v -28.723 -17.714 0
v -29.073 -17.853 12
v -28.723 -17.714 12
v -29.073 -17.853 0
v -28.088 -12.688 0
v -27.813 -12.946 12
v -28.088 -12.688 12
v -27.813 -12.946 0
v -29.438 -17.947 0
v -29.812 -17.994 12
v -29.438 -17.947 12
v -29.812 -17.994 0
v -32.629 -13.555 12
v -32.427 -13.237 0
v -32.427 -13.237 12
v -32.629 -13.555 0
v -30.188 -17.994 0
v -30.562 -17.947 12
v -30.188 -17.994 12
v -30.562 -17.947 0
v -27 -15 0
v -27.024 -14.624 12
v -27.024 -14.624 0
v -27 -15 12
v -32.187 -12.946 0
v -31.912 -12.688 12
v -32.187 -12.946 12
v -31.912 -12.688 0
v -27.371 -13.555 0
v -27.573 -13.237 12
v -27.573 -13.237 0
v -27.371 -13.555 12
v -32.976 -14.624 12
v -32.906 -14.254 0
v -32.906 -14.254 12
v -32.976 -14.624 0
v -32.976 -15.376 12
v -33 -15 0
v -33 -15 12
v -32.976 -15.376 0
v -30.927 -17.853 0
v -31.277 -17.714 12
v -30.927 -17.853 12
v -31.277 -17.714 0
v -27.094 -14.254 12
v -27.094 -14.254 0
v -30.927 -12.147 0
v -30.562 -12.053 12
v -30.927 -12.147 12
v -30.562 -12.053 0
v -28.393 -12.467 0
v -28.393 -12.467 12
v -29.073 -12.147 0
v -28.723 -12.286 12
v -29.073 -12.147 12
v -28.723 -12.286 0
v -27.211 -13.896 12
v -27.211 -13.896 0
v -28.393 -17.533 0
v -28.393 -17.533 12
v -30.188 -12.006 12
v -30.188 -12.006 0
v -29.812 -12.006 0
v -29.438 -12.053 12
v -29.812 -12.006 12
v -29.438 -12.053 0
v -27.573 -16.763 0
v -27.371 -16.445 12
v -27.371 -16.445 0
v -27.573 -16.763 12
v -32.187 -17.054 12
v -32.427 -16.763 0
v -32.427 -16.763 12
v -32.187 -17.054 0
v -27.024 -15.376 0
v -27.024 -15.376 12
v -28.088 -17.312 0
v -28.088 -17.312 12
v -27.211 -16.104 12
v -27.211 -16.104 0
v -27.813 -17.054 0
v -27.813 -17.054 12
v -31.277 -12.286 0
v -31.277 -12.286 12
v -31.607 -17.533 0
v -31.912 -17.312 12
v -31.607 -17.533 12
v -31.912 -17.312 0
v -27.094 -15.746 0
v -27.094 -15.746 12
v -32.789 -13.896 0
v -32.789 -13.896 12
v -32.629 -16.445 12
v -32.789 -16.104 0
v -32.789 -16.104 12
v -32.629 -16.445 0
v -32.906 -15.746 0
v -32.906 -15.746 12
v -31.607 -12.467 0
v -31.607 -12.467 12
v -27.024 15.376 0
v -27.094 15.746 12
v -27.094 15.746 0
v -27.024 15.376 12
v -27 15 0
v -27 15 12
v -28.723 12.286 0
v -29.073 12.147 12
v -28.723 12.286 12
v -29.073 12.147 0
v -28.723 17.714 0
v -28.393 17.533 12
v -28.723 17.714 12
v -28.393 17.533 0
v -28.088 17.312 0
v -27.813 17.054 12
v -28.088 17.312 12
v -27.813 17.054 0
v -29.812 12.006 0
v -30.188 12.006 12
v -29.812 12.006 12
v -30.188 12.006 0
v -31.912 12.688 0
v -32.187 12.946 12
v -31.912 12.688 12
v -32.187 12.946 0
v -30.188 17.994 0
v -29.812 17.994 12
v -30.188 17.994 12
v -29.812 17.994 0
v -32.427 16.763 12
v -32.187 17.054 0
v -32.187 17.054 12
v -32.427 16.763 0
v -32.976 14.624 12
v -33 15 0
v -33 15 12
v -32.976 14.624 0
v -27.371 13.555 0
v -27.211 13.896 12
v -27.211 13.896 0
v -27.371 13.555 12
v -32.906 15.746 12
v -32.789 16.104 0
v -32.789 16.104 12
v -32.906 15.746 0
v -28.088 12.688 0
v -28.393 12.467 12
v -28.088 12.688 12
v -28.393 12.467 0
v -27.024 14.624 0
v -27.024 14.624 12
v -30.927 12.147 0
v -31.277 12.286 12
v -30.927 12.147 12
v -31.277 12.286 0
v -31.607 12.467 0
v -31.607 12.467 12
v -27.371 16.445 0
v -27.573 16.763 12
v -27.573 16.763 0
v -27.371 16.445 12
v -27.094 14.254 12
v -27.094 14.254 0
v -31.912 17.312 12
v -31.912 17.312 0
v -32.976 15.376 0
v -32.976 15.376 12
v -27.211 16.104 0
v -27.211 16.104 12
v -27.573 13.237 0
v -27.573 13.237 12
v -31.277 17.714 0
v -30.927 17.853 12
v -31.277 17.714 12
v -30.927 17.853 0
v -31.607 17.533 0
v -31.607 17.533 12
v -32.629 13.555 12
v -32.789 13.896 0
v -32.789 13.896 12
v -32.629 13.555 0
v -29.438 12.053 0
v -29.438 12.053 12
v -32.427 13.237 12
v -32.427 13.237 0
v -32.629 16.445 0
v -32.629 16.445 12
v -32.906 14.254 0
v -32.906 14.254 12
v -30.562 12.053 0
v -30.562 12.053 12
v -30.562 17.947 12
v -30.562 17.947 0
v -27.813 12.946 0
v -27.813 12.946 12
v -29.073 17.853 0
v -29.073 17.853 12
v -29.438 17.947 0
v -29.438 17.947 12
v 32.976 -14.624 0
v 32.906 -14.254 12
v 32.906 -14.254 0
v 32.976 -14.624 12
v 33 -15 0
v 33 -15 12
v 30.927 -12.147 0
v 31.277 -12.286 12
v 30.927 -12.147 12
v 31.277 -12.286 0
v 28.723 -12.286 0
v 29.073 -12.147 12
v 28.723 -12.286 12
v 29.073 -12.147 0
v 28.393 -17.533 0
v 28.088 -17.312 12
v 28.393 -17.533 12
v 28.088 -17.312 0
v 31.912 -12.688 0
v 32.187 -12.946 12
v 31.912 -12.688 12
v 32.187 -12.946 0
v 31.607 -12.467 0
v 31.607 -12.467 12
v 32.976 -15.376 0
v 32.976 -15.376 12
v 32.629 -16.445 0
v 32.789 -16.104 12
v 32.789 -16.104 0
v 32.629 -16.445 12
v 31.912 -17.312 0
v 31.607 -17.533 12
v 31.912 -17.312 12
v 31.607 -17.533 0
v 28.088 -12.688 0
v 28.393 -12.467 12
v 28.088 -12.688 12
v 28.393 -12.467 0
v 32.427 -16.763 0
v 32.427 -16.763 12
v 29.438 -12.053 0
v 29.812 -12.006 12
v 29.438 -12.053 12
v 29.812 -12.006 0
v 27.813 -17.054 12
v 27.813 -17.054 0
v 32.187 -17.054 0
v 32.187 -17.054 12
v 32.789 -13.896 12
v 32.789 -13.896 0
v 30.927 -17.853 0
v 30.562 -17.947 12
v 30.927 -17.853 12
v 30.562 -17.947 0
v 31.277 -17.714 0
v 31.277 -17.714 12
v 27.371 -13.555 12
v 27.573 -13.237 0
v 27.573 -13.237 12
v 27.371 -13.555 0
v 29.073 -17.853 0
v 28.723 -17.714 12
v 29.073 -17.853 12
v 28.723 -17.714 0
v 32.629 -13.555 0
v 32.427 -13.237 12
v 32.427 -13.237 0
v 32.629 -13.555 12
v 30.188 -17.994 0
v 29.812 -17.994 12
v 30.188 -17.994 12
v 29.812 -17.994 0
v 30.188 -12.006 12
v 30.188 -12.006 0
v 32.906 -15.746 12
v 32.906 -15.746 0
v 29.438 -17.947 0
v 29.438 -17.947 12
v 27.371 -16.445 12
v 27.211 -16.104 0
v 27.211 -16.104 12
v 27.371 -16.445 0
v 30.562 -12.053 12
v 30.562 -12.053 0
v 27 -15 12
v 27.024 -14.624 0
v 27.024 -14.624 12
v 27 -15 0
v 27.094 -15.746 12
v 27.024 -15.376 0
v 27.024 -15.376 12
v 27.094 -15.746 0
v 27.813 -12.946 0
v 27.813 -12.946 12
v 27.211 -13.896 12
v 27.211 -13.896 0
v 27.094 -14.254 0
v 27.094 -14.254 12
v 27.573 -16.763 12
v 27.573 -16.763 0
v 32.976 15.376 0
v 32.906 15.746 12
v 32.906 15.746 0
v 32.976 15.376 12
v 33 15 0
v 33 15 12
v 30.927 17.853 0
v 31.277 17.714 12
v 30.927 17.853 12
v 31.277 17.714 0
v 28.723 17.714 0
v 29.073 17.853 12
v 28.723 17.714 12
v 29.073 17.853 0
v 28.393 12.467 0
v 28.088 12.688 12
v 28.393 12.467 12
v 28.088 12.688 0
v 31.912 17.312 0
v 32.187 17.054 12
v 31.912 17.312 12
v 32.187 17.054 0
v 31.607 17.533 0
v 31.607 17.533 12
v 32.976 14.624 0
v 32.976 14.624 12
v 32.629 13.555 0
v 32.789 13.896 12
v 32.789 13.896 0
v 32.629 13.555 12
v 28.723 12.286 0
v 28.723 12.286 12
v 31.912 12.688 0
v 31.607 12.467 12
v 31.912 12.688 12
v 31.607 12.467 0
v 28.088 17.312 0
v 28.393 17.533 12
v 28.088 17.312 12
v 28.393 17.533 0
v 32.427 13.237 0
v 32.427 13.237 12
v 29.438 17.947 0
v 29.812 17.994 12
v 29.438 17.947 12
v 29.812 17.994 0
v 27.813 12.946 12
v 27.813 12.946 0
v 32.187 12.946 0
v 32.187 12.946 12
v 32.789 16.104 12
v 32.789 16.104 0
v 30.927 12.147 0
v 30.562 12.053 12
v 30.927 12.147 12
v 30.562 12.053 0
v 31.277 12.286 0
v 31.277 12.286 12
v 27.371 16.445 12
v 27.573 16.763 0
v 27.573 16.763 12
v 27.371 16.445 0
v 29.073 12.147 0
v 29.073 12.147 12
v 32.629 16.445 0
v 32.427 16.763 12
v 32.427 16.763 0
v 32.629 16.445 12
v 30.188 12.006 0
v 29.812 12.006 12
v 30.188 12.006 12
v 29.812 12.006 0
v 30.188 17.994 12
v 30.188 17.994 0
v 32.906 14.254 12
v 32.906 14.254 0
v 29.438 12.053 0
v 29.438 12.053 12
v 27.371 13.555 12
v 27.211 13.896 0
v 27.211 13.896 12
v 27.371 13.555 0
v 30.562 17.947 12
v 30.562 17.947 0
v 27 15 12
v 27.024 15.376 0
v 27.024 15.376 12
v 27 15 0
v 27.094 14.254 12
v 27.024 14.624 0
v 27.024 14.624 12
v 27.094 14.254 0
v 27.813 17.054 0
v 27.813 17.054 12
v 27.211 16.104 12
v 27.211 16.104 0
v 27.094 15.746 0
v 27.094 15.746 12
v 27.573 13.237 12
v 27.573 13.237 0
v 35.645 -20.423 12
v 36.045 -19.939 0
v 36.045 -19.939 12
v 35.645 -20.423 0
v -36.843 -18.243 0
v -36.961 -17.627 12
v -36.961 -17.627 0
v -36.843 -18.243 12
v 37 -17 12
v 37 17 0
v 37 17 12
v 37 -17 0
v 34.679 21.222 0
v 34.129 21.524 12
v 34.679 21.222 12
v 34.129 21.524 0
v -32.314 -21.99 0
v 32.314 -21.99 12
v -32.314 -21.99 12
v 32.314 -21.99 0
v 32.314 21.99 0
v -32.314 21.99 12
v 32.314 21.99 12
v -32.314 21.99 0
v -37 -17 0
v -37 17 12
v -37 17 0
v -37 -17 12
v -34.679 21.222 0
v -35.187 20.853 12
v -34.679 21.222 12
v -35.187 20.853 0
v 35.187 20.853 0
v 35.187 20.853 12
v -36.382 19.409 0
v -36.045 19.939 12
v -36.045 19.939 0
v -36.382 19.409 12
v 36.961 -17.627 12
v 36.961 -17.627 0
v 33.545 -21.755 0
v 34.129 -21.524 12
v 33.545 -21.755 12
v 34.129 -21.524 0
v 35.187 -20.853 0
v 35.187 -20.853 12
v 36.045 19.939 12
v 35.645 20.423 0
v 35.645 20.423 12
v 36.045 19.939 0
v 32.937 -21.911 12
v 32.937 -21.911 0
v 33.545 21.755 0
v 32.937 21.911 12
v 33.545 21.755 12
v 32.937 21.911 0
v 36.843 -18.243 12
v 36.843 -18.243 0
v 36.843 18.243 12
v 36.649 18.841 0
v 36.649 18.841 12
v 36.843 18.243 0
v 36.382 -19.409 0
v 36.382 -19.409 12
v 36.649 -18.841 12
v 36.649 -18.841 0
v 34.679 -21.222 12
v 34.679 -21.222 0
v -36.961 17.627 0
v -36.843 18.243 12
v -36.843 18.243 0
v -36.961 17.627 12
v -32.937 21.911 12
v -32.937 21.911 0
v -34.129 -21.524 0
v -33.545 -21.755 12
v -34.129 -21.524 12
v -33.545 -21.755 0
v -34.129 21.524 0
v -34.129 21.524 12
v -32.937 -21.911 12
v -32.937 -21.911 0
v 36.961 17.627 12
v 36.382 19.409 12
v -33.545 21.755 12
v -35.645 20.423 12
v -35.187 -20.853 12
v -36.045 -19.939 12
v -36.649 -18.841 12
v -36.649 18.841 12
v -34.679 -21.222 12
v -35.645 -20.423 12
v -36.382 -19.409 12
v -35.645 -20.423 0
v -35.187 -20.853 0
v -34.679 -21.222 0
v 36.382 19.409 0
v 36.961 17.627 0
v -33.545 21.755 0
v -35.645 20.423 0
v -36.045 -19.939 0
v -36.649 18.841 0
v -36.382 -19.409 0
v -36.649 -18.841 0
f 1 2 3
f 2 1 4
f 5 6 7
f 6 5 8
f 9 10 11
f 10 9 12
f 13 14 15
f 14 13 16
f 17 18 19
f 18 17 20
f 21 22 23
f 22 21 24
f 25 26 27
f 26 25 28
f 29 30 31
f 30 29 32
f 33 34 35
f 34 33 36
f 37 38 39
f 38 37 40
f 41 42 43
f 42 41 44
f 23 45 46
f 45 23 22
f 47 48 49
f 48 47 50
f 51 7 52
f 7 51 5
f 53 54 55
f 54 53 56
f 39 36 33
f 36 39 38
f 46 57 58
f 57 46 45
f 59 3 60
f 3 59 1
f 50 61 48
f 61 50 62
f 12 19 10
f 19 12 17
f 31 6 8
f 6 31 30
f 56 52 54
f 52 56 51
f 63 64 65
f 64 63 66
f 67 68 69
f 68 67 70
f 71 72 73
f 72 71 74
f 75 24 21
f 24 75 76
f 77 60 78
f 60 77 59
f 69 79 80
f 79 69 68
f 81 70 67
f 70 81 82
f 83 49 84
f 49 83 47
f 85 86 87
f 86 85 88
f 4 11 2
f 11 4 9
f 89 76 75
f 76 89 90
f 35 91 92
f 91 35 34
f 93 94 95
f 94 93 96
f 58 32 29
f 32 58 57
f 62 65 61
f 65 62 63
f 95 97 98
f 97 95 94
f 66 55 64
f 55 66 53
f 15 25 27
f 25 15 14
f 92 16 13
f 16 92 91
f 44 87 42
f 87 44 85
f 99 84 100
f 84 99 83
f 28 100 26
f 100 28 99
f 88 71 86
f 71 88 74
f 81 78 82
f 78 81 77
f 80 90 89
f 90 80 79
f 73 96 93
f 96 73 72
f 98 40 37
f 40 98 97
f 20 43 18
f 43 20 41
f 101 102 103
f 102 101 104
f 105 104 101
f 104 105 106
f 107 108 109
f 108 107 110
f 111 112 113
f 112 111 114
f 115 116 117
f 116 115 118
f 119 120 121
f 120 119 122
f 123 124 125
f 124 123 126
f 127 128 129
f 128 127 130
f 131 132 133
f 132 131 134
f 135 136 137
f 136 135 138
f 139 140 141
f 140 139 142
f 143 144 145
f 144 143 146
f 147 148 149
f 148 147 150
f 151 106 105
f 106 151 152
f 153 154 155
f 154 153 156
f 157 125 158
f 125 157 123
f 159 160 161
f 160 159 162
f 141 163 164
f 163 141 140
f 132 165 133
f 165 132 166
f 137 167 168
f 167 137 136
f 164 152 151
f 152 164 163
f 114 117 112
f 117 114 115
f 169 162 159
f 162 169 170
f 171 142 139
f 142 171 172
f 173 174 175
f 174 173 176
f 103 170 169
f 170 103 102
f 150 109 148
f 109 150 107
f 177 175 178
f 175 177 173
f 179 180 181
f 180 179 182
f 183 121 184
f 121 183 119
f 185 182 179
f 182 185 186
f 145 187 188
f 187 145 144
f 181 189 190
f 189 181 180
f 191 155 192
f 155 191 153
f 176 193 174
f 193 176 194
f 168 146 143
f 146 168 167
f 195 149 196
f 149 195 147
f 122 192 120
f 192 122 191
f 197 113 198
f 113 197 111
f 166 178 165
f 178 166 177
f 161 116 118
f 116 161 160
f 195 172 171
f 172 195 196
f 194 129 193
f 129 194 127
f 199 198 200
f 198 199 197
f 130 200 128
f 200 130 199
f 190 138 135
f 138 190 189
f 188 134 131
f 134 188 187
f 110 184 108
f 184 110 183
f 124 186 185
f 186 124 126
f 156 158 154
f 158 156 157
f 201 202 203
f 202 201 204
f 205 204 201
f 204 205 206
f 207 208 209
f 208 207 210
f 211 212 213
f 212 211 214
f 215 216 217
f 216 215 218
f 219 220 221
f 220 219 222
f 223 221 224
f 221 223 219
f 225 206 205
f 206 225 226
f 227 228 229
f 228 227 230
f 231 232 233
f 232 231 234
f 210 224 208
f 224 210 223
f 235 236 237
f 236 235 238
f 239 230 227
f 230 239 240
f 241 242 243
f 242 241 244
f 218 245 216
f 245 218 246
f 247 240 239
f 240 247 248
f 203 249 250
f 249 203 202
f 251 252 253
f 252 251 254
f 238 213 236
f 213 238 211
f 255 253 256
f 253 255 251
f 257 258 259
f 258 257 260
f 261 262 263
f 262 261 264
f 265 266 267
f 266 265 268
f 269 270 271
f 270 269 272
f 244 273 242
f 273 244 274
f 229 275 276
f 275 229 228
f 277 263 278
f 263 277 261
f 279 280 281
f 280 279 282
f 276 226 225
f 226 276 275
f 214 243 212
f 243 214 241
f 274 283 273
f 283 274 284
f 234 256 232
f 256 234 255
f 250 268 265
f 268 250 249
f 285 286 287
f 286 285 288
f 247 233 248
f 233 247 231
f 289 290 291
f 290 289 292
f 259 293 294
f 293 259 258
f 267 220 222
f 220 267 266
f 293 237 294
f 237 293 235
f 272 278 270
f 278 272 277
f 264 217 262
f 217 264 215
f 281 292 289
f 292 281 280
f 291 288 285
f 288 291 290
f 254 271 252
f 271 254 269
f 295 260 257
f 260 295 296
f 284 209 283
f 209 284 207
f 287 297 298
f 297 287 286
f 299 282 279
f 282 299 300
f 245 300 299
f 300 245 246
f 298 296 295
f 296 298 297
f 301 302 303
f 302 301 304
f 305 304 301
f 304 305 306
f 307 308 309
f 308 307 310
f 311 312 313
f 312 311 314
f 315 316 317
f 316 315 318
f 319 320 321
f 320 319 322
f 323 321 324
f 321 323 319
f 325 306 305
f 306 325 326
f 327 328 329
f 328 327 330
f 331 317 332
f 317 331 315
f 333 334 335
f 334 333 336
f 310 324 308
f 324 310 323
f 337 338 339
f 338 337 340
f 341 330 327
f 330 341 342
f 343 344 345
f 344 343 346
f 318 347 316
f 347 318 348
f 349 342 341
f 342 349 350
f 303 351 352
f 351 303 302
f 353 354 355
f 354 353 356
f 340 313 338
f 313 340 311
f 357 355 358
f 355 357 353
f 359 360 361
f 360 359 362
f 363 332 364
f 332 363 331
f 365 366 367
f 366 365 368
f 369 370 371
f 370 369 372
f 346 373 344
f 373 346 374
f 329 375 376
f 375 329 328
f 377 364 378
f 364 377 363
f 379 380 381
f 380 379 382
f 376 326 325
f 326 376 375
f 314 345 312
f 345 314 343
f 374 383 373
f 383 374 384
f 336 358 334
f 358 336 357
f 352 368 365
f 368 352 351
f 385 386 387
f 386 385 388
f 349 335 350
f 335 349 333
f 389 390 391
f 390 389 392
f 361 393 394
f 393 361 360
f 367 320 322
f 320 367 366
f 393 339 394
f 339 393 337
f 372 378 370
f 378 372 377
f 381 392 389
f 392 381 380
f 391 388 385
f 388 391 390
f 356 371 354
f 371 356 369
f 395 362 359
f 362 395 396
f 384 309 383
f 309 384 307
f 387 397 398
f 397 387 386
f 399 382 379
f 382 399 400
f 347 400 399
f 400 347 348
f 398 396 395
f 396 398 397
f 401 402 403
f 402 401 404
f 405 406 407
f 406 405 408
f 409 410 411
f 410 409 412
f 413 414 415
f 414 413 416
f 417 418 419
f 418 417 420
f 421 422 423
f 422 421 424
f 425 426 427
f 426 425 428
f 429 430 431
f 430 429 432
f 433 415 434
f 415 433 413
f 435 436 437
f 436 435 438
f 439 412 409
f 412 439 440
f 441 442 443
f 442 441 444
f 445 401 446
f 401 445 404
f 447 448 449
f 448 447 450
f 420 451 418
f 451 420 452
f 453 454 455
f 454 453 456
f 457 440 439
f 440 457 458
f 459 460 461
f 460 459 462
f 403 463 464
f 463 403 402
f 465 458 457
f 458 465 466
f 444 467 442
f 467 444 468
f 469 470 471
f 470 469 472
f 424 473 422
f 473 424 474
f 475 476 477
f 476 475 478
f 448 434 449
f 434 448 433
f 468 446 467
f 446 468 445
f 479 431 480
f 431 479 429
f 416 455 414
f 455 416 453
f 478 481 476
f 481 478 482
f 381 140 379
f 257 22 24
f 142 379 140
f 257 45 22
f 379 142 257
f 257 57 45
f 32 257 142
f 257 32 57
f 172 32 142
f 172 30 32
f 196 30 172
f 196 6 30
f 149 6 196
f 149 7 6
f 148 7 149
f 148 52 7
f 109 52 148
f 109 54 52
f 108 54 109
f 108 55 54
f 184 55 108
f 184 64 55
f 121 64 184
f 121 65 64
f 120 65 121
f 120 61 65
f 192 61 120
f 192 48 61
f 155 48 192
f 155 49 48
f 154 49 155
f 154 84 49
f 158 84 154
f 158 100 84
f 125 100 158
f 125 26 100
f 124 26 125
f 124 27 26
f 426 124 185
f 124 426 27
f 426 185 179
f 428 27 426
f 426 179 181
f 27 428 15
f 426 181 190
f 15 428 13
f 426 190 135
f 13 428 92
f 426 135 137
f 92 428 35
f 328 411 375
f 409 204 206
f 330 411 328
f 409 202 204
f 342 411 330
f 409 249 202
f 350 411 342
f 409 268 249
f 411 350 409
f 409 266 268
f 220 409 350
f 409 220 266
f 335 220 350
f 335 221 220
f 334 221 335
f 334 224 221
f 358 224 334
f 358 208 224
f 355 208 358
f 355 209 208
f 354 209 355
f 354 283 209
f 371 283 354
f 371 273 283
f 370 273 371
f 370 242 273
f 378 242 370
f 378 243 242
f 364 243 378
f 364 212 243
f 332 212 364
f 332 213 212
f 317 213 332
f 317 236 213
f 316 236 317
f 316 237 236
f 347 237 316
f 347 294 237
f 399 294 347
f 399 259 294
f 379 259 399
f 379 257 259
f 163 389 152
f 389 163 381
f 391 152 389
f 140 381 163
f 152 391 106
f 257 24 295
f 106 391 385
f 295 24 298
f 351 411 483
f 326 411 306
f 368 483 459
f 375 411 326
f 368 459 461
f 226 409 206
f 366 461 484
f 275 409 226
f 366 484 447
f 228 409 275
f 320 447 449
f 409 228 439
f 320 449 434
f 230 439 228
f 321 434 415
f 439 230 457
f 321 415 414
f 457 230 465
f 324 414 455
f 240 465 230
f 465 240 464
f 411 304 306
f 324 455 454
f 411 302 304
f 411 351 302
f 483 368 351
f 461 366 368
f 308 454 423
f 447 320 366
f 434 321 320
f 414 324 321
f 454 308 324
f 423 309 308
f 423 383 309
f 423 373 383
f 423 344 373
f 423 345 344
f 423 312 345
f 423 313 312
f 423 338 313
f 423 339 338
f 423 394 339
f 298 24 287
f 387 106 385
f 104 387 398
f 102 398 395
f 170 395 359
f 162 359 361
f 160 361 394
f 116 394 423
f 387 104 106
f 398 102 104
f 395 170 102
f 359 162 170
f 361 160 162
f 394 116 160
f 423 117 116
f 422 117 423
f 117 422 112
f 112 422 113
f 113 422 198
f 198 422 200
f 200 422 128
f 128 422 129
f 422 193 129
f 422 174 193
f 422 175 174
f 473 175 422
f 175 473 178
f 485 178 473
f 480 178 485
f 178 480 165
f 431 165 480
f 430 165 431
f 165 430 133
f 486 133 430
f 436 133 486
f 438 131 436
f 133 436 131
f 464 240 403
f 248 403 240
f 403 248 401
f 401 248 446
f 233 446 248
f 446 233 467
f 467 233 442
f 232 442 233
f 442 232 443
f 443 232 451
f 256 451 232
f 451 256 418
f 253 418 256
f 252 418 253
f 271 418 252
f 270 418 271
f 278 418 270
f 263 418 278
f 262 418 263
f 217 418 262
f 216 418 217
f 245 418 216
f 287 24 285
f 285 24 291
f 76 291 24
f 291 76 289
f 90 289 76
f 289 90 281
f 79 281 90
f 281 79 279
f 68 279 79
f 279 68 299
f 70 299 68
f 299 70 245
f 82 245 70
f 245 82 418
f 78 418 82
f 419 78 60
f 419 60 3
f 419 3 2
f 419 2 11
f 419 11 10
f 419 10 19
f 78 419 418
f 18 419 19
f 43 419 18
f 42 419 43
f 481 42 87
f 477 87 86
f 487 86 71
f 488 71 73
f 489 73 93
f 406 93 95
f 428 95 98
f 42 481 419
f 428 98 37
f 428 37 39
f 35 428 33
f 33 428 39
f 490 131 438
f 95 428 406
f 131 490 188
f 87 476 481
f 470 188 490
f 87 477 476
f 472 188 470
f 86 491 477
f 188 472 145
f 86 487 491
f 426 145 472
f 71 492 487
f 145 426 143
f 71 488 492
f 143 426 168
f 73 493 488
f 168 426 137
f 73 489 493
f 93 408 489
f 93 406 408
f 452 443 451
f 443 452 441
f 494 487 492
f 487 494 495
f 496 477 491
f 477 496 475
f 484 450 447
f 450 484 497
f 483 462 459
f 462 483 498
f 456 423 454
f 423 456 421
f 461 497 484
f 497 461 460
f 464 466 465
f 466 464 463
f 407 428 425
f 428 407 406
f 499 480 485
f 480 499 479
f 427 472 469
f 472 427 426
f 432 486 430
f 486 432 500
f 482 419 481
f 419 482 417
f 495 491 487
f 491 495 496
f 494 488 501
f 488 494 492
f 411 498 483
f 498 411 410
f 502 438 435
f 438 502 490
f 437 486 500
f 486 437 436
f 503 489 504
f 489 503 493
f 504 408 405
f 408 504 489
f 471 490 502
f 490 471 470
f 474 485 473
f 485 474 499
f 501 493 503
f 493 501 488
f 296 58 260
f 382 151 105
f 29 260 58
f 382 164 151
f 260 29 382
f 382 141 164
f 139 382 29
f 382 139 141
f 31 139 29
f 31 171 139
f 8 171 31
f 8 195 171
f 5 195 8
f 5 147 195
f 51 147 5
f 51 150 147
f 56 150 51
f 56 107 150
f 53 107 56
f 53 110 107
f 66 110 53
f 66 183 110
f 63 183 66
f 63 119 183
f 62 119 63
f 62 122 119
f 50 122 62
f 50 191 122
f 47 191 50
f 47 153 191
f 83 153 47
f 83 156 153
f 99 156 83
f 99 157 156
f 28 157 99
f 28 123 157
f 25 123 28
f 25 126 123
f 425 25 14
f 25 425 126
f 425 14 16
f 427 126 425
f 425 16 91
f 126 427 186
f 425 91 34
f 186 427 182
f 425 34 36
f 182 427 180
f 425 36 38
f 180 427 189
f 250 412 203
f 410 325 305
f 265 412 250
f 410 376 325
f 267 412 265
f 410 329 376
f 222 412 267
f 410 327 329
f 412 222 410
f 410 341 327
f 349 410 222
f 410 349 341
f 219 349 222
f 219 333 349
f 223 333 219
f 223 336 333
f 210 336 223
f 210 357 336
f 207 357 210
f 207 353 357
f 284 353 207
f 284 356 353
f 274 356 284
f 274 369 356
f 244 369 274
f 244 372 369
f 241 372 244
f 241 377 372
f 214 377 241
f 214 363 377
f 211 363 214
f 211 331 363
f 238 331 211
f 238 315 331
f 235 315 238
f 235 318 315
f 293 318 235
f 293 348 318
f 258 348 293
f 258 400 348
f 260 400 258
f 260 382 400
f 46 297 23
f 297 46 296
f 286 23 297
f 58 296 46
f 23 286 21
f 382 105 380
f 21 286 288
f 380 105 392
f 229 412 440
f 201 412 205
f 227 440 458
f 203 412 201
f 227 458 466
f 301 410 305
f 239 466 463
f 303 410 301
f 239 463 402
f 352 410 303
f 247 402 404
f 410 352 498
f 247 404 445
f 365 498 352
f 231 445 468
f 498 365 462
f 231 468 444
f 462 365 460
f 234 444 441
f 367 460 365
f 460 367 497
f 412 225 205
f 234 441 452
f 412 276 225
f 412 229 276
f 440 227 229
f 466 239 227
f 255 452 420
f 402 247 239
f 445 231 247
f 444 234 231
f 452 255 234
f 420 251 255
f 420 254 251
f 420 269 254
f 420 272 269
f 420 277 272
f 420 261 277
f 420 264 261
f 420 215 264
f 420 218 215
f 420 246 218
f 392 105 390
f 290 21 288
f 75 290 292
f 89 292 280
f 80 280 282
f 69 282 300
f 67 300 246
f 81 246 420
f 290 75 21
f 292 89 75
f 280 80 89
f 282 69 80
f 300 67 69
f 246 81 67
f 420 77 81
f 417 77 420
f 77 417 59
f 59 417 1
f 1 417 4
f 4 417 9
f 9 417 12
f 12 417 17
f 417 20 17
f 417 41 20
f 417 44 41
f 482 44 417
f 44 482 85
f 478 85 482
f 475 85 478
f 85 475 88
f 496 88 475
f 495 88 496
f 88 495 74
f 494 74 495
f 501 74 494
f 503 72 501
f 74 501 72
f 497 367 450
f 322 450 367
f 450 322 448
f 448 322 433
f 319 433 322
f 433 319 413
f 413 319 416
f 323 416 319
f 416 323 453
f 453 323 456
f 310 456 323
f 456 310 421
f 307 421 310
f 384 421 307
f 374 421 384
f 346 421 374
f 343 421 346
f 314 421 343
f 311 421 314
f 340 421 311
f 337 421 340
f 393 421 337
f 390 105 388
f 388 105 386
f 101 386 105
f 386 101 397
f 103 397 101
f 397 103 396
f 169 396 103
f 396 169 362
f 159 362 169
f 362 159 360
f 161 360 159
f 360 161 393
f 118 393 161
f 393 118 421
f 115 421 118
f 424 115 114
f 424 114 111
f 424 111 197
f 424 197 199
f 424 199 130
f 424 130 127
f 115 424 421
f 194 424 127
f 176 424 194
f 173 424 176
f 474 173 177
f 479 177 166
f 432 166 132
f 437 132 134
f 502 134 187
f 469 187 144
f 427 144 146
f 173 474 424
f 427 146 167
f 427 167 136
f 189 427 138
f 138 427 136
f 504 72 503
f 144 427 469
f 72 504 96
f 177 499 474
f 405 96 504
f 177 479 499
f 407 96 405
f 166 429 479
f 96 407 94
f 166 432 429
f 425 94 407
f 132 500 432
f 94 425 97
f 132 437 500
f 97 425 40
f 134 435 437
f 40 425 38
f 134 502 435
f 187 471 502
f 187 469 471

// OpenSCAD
$fn = 50;


difference() {
	union() {
		hull() {
			translate(v = [-32.0000000000, 17.0000000000, 0]) {
				cylinder(h = 12, r = 5);
			}
			translate(v = [32.0000000000, 17.0000000000, 0]) {
				cylinder(h = 12, r = 5);
			}
			translate(v = [-32.0000000000, -17.0000000000, 0]) {
				cylinder(h = 12, r = 5);
			}
			translate(v = [32.0000000000, -17.0000000000, 0]) {
				cylinder(h = 12, r = 5);
			}
		}
	}
	union() {
		translate(v = [-30.0000000000, -15.0000000000, -100.0000000000]) {
			cylinder(h = 200, r = 3.0000000000);
		}
		translate(v = [-30.0000000000, 15.0000000000, -100.0000000000]) {
			cylinder(h = 200, r = 3.0000000000);
		}
		translate(v = [30.0000000000, -15.0000000000, -100.0000000000]) {
			cylinder(h = 200, r = 3.0000000000);
		}
		translate(v = [30.0000000000, 15.0000000000, -100.0000000000]) {
			cylinder(h = 200, r = 3.0000000000);
		}
	}
}
